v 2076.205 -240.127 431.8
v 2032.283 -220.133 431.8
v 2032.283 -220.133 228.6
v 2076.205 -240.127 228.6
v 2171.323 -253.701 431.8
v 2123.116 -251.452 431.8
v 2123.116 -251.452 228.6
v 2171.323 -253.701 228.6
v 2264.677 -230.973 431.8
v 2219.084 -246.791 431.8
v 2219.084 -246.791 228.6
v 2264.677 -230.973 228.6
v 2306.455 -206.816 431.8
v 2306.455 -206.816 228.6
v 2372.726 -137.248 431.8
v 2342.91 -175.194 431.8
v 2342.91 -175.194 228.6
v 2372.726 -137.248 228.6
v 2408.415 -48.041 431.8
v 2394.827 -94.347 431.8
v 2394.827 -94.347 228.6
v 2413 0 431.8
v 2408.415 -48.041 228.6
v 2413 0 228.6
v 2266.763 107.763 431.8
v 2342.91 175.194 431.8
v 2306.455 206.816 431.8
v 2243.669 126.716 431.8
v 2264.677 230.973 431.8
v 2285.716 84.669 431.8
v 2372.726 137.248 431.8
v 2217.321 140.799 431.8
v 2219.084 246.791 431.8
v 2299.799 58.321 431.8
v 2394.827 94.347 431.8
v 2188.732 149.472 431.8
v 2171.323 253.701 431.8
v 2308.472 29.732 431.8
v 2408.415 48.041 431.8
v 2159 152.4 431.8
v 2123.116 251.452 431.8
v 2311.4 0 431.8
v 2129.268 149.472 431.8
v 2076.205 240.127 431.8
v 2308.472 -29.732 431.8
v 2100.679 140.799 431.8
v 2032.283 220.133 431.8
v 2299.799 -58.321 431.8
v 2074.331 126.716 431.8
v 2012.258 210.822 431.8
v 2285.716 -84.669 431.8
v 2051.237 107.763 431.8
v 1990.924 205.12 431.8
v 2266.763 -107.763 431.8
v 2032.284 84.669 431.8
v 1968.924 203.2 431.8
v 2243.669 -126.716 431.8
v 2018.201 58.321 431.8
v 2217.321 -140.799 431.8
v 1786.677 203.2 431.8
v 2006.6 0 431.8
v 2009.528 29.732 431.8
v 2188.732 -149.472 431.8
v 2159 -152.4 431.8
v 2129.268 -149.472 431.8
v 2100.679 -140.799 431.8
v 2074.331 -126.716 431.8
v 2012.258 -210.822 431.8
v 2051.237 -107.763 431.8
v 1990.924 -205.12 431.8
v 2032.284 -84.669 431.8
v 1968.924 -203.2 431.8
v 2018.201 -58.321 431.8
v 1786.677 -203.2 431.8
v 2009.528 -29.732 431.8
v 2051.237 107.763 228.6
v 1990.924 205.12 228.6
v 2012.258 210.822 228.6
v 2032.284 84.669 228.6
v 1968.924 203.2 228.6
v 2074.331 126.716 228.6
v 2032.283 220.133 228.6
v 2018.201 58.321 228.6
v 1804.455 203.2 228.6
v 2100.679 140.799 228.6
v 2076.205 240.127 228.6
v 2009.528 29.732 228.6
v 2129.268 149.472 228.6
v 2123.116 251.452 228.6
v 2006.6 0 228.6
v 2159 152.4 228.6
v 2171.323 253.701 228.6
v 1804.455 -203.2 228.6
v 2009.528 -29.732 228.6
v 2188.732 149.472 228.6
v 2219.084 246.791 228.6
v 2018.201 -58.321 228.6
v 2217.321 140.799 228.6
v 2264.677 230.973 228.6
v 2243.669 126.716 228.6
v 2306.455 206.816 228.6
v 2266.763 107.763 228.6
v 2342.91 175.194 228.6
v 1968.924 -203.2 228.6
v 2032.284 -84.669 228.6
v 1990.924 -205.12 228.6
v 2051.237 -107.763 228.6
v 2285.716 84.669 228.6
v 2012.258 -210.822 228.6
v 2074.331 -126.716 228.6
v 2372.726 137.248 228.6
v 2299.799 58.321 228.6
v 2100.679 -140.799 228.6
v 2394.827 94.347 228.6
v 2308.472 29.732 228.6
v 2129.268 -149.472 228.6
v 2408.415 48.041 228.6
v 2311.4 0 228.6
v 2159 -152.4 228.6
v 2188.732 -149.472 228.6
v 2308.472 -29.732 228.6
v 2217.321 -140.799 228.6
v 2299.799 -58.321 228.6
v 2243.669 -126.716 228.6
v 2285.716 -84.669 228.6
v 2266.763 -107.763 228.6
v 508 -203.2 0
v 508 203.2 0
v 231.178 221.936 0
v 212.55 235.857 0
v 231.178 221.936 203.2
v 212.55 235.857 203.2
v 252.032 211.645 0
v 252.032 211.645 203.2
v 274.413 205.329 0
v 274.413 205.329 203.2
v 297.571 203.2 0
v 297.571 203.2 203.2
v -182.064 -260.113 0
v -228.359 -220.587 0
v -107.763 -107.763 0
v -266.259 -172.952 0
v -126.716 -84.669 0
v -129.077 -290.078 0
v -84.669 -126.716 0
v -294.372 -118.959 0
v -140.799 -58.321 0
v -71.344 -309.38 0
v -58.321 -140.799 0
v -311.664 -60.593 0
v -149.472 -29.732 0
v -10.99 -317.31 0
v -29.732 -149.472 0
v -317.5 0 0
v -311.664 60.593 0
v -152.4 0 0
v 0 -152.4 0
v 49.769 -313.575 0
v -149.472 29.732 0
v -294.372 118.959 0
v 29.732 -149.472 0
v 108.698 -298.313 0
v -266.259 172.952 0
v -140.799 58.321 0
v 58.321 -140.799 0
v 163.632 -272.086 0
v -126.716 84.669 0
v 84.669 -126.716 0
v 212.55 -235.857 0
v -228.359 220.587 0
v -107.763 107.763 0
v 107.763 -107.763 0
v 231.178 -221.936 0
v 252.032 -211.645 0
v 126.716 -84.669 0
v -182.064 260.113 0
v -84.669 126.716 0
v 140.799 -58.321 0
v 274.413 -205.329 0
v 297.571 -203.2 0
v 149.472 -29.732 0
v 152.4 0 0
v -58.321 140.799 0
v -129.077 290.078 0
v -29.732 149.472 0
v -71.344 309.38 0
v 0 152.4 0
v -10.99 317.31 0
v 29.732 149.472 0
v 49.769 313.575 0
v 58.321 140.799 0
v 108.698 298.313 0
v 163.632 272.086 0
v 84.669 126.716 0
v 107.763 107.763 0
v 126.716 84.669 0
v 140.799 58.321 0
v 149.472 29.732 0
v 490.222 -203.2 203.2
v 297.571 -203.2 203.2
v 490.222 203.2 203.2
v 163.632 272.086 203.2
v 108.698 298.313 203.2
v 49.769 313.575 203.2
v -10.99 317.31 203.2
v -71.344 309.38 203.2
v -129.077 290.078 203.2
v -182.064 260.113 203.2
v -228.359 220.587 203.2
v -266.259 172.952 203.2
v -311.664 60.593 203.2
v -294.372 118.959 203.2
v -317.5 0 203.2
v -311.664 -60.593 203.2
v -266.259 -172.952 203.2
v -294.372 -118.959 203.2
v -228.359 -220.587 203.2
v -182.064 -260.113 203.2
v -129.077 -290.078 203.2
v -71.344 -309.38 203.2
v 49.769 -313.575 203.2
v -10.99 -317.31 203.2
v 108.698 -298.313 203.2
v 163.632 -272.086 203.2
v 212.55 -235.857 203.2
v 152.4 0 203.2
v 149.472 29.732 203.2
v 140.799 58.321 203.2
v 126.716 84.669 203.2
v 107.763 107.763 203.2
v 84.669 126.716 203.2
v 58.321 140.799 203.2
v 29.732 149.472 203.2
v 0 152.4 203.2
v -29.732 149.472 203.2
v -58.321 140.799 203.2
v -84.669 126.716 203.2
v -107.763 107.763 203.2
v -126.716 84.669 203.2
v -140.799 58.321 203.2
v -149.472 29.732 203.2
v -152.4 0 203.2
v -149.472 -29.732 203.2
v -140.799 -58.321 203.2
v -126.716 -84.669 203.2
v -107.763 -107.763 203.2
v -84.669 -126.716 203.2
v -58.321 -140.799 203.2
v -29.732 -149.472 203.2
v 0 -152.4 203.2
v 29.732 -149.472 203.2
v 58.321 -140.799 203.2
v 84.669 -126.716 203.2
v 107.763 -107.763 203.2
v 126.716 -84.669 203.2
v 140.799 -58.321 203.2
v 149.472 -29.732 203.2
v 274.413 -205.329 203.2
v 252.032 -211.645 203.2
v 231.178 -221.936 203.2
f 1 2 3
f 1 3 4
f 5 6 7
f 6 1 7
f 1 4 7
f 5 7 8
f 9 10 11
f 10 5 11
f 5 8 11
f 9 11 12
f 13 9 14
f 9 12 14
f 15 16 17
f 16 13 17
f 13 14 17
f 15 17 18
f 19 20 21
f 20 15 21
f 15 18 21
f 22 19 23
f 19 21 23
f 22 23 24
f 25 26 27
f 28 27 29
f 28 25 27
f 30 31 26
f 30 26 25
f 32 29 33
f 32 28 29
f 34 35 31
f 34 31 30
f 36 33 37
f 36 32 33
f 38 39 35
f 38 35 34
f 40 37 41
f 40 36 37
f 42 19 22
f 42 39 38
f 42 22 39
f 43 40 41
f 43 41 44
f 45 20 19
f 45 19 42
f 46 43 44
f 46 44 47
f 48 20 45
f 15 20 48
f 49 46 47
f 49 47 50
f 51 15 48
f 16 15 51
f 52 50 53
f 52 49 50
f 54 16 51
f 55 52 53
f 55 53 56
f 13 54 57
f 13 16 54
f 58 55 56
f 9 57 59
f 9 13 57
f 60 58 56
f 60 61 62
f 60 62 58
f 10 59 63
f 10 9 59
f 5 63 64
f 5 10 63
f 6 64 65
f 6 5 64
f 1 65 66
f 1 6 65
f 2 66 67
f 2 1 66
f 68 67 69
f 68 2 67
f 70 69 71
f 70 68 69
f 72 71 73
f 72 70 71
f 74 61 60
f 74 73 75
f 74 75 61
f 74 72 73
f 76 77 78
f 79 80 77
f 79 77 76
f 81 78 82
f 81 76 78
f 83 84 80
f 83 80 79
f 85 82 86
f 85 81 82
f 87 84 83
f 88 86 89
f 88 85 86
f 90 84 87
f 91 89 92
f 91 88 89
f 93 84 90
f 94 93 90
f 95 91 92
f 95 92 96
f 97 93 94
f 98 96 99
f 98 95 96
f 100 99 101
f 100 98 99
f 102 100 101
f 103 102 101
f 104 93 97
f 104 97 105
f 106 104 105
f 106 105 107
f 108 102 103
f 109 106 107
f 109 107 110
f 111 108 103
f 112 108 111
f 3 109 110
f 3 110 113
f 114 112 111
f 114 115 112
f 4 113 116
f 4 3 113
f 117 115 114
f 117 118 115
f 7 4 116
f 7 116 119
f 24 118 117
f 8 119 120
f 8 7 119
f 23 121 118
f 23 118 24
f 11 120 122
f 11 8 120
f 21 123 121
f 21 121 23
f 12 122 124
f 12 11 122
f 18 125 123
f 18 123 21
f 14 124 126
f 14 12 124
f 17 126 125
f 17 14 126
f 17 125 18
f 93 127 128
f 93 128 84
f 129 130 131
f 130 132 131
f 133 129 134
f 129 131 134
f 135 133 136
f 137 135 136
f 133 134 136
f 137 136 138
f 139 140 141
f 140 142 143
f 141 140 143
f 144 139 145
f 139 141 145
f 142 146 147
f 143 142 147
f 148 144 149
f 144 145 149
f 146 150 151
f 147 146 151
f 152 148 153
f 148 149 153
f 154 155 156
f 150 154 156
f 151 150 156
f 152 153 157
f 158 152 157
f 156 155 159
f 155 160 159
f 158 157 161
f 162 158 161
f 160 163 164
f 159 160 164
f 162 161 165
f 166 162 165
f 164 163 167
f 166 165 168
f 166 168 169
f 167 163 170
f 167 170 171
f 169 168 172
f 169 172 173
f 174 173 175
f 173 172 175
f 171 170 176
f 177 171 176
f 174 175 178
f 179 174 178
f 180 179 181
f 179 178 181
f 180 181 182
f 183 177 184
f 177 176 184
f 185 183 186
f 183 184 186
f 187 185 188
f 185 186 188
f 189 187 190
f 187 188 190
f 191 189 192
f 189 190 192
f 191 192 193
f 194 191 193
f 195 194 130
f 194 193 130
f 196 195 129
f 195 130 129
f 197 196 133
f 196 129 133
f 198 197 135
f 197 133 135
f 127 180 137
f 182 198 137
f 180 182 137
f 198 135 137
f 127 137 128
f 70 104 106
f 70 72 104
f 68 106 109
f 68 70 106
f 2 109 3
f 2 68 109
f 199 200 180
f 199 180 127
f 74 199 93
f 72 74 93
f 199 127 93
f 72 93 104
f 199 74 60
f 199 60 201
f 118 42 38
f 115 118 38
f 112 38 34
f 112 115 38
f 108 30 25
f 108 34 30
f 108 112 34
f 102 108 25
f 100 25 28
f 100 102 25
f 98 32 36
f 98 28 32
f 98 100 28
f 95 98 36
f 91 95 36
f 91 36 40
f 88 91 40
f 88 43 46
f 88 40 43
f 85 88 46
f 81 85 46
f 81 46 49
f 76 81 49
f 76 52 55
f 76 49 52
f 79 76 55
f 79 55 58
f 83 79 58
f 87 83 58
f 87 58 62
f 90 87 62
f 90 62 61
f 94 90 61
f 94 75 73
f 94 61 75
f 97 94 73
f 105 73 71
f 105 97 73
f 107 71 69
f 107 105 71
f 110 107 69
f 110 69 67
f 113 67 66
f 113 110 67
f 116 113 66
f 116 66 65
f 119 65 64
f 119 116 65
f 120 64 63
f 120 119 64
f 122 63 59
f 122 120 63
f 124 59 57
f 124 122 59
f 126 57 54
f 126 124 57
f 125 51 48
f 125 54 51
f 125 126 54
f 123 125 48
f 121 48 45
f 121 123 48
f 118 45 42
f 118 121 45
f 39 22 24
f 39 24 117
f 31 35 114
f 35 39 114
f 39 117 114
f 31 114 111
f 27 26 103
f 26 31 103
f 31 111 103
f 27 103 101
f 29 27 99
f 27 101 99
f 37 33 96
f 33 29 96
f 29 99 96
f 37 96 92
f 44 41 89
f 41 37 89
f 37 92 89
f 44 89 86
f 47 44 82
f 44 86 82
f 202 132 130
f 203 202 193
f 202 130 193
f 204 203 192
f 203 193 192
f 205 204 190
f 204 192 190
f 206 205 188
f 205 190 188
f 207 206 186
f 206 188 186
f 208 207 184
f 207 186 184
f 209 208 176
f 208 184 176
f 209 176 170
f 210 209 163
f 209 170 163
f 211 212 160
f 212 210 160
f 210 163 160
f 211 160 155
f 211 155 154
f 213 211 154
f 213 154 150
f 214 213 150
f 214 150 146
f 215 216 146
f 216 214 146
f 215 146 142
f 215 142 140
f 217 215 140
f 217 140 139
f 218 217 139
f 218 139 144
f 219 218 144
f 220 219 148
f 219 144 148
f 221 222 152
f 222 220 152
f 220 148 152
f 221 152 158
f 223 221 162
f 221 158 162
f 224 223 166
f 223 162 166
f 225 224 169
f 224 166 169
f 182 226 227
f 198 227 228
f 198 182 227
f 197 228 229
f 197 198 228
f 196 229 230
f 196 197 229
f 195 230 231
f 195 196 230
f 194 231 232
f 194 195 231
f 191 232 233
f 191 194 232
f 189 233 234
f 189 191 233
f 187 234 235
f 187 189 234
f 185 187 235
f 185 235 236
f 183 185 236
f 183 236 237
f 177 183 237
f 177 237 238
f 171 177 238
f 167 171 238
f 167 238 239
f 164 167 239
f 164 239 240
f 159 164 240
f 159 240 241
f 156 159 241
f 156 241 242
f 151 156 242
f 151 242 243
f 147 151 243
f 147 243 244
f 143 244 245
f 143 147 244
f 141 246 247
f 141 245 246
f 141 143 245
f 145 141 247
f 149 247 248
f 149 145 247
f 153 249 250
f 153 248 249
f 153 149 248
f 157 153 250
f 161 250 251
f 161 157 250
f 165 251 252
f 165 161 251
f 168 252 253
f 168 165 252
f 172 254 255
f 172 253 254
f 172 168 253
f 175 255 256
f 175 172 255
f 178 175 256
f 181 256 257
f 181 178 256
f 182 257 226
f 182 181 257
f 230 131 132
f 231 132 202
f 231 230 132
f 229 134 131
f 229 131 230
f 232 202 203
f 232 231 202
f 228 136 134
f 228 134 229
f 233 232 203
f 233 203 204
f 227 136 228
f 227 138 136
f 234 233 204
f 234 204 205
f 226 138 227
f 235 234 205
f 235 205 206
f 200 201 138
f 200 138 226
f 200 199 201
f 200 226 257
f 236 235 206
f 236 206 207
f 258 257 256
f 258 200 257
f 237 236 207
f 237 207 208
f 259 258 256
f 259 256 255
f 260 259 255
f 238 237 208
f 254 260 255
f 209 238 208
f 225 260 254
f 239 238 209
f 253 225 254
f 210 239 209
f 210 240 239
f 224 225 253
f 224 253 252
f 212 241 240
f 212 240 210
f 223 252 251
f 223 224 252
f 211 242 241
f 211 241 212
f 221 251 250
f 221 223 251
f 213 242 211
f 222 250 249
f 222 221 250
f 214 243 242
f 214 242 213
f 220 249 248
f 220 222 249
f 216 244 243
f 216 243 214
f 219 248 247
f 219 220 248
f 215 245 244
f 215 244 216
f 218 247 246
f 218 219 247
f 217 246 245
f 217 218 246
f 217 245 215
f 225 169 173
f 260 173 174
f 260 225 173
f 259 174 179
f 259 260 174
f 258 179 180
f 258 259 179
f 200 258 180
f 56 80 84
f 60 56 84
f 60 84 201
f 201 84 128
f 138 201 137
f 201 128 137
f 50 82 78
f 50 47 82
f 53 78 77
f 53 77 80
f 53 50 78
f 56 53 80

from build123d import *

# Parameters (mm, degrees)
F0_R     = 152.4
F1_DEPTH = 635
F3_DEPTH = 317.5
F4_R     = 127


with BuildPart() as f1:
    # F0 (on Top) → F1 (new body)
    with BuildSketch(Plane.XY):
        with BuildLine():
            ThreePointArc((243.959033, -203.2), (298.549195, -108.049195), (317.5, 0))
            ThreePointArc((317.5, 0), (298.549195, 108.049195), (243.959033, 203.2))
            ThreePointArc((243.959033, 203.2), (-317.5, 0), (243.959033, -203.2))
        make_face()
        Circle(F0_R, mode=Mode.SUBTRACT)
        with BuildLine():
            ThreePointArc((243.959033, 203.2), (298.549195, 108.049195), (317.5, 0))
            ThreePointArc((317.5, 0), (298.549195, -108.049195), (243.959033, -203.2))
            Line((243.959033, -203.2), (2006.6, -203.2))
            ThreePointArc((2006.6, -203.2), (1905, 0), (2006.6, 203.2))
            Line((2006.6, 203.2), (243.959033, 203.2))
        make_face()
        with BuildLine():
            ThreePointArc((2413, 0), (2272.592253, 227.184507), (2006.6, 203.2))
            ThreePointArc((2006.6, 203.2), (1905, 0), (2006.6, -203.2))
            ThreePointArc((2006.6, -203.2), (2272.592253, -227.184507), (2413, 0))
        make_face()
        with Locations((2159, 0)):
            Circle(F0_R, mode=Mode.SUBTRACT)
    extrude(amount=F1_DEPTH)

    # F2 (on Front) → F3 (intersect, symmetric)
    with BuildSketch(Plane.XZ):
        Polygon((-317.5, 203.2), (-317.5, 0), (508, 0), (1804.455024, 228.6), (2413, 228.6), (2413, 431.8), (1786.677328, 431.8), (490.222304, 203.2), align=None)
    extrude(amount=F3_DEPTH, both=True, mode=Mode.INTERSECT)

    # F4
    f4_edges = [f1.edges().sort_by_distance(p)[0] for p in [
        (2006.6, 203.2, 330.2),
        (243.959033, 203.2, 101.6),
        (243.959033, -203.2, 101.6),
        (2006.6, -203.2, 330.2),
    ]]
    fillet(f4_edges, radius=F4_R)


solid = f1.part
